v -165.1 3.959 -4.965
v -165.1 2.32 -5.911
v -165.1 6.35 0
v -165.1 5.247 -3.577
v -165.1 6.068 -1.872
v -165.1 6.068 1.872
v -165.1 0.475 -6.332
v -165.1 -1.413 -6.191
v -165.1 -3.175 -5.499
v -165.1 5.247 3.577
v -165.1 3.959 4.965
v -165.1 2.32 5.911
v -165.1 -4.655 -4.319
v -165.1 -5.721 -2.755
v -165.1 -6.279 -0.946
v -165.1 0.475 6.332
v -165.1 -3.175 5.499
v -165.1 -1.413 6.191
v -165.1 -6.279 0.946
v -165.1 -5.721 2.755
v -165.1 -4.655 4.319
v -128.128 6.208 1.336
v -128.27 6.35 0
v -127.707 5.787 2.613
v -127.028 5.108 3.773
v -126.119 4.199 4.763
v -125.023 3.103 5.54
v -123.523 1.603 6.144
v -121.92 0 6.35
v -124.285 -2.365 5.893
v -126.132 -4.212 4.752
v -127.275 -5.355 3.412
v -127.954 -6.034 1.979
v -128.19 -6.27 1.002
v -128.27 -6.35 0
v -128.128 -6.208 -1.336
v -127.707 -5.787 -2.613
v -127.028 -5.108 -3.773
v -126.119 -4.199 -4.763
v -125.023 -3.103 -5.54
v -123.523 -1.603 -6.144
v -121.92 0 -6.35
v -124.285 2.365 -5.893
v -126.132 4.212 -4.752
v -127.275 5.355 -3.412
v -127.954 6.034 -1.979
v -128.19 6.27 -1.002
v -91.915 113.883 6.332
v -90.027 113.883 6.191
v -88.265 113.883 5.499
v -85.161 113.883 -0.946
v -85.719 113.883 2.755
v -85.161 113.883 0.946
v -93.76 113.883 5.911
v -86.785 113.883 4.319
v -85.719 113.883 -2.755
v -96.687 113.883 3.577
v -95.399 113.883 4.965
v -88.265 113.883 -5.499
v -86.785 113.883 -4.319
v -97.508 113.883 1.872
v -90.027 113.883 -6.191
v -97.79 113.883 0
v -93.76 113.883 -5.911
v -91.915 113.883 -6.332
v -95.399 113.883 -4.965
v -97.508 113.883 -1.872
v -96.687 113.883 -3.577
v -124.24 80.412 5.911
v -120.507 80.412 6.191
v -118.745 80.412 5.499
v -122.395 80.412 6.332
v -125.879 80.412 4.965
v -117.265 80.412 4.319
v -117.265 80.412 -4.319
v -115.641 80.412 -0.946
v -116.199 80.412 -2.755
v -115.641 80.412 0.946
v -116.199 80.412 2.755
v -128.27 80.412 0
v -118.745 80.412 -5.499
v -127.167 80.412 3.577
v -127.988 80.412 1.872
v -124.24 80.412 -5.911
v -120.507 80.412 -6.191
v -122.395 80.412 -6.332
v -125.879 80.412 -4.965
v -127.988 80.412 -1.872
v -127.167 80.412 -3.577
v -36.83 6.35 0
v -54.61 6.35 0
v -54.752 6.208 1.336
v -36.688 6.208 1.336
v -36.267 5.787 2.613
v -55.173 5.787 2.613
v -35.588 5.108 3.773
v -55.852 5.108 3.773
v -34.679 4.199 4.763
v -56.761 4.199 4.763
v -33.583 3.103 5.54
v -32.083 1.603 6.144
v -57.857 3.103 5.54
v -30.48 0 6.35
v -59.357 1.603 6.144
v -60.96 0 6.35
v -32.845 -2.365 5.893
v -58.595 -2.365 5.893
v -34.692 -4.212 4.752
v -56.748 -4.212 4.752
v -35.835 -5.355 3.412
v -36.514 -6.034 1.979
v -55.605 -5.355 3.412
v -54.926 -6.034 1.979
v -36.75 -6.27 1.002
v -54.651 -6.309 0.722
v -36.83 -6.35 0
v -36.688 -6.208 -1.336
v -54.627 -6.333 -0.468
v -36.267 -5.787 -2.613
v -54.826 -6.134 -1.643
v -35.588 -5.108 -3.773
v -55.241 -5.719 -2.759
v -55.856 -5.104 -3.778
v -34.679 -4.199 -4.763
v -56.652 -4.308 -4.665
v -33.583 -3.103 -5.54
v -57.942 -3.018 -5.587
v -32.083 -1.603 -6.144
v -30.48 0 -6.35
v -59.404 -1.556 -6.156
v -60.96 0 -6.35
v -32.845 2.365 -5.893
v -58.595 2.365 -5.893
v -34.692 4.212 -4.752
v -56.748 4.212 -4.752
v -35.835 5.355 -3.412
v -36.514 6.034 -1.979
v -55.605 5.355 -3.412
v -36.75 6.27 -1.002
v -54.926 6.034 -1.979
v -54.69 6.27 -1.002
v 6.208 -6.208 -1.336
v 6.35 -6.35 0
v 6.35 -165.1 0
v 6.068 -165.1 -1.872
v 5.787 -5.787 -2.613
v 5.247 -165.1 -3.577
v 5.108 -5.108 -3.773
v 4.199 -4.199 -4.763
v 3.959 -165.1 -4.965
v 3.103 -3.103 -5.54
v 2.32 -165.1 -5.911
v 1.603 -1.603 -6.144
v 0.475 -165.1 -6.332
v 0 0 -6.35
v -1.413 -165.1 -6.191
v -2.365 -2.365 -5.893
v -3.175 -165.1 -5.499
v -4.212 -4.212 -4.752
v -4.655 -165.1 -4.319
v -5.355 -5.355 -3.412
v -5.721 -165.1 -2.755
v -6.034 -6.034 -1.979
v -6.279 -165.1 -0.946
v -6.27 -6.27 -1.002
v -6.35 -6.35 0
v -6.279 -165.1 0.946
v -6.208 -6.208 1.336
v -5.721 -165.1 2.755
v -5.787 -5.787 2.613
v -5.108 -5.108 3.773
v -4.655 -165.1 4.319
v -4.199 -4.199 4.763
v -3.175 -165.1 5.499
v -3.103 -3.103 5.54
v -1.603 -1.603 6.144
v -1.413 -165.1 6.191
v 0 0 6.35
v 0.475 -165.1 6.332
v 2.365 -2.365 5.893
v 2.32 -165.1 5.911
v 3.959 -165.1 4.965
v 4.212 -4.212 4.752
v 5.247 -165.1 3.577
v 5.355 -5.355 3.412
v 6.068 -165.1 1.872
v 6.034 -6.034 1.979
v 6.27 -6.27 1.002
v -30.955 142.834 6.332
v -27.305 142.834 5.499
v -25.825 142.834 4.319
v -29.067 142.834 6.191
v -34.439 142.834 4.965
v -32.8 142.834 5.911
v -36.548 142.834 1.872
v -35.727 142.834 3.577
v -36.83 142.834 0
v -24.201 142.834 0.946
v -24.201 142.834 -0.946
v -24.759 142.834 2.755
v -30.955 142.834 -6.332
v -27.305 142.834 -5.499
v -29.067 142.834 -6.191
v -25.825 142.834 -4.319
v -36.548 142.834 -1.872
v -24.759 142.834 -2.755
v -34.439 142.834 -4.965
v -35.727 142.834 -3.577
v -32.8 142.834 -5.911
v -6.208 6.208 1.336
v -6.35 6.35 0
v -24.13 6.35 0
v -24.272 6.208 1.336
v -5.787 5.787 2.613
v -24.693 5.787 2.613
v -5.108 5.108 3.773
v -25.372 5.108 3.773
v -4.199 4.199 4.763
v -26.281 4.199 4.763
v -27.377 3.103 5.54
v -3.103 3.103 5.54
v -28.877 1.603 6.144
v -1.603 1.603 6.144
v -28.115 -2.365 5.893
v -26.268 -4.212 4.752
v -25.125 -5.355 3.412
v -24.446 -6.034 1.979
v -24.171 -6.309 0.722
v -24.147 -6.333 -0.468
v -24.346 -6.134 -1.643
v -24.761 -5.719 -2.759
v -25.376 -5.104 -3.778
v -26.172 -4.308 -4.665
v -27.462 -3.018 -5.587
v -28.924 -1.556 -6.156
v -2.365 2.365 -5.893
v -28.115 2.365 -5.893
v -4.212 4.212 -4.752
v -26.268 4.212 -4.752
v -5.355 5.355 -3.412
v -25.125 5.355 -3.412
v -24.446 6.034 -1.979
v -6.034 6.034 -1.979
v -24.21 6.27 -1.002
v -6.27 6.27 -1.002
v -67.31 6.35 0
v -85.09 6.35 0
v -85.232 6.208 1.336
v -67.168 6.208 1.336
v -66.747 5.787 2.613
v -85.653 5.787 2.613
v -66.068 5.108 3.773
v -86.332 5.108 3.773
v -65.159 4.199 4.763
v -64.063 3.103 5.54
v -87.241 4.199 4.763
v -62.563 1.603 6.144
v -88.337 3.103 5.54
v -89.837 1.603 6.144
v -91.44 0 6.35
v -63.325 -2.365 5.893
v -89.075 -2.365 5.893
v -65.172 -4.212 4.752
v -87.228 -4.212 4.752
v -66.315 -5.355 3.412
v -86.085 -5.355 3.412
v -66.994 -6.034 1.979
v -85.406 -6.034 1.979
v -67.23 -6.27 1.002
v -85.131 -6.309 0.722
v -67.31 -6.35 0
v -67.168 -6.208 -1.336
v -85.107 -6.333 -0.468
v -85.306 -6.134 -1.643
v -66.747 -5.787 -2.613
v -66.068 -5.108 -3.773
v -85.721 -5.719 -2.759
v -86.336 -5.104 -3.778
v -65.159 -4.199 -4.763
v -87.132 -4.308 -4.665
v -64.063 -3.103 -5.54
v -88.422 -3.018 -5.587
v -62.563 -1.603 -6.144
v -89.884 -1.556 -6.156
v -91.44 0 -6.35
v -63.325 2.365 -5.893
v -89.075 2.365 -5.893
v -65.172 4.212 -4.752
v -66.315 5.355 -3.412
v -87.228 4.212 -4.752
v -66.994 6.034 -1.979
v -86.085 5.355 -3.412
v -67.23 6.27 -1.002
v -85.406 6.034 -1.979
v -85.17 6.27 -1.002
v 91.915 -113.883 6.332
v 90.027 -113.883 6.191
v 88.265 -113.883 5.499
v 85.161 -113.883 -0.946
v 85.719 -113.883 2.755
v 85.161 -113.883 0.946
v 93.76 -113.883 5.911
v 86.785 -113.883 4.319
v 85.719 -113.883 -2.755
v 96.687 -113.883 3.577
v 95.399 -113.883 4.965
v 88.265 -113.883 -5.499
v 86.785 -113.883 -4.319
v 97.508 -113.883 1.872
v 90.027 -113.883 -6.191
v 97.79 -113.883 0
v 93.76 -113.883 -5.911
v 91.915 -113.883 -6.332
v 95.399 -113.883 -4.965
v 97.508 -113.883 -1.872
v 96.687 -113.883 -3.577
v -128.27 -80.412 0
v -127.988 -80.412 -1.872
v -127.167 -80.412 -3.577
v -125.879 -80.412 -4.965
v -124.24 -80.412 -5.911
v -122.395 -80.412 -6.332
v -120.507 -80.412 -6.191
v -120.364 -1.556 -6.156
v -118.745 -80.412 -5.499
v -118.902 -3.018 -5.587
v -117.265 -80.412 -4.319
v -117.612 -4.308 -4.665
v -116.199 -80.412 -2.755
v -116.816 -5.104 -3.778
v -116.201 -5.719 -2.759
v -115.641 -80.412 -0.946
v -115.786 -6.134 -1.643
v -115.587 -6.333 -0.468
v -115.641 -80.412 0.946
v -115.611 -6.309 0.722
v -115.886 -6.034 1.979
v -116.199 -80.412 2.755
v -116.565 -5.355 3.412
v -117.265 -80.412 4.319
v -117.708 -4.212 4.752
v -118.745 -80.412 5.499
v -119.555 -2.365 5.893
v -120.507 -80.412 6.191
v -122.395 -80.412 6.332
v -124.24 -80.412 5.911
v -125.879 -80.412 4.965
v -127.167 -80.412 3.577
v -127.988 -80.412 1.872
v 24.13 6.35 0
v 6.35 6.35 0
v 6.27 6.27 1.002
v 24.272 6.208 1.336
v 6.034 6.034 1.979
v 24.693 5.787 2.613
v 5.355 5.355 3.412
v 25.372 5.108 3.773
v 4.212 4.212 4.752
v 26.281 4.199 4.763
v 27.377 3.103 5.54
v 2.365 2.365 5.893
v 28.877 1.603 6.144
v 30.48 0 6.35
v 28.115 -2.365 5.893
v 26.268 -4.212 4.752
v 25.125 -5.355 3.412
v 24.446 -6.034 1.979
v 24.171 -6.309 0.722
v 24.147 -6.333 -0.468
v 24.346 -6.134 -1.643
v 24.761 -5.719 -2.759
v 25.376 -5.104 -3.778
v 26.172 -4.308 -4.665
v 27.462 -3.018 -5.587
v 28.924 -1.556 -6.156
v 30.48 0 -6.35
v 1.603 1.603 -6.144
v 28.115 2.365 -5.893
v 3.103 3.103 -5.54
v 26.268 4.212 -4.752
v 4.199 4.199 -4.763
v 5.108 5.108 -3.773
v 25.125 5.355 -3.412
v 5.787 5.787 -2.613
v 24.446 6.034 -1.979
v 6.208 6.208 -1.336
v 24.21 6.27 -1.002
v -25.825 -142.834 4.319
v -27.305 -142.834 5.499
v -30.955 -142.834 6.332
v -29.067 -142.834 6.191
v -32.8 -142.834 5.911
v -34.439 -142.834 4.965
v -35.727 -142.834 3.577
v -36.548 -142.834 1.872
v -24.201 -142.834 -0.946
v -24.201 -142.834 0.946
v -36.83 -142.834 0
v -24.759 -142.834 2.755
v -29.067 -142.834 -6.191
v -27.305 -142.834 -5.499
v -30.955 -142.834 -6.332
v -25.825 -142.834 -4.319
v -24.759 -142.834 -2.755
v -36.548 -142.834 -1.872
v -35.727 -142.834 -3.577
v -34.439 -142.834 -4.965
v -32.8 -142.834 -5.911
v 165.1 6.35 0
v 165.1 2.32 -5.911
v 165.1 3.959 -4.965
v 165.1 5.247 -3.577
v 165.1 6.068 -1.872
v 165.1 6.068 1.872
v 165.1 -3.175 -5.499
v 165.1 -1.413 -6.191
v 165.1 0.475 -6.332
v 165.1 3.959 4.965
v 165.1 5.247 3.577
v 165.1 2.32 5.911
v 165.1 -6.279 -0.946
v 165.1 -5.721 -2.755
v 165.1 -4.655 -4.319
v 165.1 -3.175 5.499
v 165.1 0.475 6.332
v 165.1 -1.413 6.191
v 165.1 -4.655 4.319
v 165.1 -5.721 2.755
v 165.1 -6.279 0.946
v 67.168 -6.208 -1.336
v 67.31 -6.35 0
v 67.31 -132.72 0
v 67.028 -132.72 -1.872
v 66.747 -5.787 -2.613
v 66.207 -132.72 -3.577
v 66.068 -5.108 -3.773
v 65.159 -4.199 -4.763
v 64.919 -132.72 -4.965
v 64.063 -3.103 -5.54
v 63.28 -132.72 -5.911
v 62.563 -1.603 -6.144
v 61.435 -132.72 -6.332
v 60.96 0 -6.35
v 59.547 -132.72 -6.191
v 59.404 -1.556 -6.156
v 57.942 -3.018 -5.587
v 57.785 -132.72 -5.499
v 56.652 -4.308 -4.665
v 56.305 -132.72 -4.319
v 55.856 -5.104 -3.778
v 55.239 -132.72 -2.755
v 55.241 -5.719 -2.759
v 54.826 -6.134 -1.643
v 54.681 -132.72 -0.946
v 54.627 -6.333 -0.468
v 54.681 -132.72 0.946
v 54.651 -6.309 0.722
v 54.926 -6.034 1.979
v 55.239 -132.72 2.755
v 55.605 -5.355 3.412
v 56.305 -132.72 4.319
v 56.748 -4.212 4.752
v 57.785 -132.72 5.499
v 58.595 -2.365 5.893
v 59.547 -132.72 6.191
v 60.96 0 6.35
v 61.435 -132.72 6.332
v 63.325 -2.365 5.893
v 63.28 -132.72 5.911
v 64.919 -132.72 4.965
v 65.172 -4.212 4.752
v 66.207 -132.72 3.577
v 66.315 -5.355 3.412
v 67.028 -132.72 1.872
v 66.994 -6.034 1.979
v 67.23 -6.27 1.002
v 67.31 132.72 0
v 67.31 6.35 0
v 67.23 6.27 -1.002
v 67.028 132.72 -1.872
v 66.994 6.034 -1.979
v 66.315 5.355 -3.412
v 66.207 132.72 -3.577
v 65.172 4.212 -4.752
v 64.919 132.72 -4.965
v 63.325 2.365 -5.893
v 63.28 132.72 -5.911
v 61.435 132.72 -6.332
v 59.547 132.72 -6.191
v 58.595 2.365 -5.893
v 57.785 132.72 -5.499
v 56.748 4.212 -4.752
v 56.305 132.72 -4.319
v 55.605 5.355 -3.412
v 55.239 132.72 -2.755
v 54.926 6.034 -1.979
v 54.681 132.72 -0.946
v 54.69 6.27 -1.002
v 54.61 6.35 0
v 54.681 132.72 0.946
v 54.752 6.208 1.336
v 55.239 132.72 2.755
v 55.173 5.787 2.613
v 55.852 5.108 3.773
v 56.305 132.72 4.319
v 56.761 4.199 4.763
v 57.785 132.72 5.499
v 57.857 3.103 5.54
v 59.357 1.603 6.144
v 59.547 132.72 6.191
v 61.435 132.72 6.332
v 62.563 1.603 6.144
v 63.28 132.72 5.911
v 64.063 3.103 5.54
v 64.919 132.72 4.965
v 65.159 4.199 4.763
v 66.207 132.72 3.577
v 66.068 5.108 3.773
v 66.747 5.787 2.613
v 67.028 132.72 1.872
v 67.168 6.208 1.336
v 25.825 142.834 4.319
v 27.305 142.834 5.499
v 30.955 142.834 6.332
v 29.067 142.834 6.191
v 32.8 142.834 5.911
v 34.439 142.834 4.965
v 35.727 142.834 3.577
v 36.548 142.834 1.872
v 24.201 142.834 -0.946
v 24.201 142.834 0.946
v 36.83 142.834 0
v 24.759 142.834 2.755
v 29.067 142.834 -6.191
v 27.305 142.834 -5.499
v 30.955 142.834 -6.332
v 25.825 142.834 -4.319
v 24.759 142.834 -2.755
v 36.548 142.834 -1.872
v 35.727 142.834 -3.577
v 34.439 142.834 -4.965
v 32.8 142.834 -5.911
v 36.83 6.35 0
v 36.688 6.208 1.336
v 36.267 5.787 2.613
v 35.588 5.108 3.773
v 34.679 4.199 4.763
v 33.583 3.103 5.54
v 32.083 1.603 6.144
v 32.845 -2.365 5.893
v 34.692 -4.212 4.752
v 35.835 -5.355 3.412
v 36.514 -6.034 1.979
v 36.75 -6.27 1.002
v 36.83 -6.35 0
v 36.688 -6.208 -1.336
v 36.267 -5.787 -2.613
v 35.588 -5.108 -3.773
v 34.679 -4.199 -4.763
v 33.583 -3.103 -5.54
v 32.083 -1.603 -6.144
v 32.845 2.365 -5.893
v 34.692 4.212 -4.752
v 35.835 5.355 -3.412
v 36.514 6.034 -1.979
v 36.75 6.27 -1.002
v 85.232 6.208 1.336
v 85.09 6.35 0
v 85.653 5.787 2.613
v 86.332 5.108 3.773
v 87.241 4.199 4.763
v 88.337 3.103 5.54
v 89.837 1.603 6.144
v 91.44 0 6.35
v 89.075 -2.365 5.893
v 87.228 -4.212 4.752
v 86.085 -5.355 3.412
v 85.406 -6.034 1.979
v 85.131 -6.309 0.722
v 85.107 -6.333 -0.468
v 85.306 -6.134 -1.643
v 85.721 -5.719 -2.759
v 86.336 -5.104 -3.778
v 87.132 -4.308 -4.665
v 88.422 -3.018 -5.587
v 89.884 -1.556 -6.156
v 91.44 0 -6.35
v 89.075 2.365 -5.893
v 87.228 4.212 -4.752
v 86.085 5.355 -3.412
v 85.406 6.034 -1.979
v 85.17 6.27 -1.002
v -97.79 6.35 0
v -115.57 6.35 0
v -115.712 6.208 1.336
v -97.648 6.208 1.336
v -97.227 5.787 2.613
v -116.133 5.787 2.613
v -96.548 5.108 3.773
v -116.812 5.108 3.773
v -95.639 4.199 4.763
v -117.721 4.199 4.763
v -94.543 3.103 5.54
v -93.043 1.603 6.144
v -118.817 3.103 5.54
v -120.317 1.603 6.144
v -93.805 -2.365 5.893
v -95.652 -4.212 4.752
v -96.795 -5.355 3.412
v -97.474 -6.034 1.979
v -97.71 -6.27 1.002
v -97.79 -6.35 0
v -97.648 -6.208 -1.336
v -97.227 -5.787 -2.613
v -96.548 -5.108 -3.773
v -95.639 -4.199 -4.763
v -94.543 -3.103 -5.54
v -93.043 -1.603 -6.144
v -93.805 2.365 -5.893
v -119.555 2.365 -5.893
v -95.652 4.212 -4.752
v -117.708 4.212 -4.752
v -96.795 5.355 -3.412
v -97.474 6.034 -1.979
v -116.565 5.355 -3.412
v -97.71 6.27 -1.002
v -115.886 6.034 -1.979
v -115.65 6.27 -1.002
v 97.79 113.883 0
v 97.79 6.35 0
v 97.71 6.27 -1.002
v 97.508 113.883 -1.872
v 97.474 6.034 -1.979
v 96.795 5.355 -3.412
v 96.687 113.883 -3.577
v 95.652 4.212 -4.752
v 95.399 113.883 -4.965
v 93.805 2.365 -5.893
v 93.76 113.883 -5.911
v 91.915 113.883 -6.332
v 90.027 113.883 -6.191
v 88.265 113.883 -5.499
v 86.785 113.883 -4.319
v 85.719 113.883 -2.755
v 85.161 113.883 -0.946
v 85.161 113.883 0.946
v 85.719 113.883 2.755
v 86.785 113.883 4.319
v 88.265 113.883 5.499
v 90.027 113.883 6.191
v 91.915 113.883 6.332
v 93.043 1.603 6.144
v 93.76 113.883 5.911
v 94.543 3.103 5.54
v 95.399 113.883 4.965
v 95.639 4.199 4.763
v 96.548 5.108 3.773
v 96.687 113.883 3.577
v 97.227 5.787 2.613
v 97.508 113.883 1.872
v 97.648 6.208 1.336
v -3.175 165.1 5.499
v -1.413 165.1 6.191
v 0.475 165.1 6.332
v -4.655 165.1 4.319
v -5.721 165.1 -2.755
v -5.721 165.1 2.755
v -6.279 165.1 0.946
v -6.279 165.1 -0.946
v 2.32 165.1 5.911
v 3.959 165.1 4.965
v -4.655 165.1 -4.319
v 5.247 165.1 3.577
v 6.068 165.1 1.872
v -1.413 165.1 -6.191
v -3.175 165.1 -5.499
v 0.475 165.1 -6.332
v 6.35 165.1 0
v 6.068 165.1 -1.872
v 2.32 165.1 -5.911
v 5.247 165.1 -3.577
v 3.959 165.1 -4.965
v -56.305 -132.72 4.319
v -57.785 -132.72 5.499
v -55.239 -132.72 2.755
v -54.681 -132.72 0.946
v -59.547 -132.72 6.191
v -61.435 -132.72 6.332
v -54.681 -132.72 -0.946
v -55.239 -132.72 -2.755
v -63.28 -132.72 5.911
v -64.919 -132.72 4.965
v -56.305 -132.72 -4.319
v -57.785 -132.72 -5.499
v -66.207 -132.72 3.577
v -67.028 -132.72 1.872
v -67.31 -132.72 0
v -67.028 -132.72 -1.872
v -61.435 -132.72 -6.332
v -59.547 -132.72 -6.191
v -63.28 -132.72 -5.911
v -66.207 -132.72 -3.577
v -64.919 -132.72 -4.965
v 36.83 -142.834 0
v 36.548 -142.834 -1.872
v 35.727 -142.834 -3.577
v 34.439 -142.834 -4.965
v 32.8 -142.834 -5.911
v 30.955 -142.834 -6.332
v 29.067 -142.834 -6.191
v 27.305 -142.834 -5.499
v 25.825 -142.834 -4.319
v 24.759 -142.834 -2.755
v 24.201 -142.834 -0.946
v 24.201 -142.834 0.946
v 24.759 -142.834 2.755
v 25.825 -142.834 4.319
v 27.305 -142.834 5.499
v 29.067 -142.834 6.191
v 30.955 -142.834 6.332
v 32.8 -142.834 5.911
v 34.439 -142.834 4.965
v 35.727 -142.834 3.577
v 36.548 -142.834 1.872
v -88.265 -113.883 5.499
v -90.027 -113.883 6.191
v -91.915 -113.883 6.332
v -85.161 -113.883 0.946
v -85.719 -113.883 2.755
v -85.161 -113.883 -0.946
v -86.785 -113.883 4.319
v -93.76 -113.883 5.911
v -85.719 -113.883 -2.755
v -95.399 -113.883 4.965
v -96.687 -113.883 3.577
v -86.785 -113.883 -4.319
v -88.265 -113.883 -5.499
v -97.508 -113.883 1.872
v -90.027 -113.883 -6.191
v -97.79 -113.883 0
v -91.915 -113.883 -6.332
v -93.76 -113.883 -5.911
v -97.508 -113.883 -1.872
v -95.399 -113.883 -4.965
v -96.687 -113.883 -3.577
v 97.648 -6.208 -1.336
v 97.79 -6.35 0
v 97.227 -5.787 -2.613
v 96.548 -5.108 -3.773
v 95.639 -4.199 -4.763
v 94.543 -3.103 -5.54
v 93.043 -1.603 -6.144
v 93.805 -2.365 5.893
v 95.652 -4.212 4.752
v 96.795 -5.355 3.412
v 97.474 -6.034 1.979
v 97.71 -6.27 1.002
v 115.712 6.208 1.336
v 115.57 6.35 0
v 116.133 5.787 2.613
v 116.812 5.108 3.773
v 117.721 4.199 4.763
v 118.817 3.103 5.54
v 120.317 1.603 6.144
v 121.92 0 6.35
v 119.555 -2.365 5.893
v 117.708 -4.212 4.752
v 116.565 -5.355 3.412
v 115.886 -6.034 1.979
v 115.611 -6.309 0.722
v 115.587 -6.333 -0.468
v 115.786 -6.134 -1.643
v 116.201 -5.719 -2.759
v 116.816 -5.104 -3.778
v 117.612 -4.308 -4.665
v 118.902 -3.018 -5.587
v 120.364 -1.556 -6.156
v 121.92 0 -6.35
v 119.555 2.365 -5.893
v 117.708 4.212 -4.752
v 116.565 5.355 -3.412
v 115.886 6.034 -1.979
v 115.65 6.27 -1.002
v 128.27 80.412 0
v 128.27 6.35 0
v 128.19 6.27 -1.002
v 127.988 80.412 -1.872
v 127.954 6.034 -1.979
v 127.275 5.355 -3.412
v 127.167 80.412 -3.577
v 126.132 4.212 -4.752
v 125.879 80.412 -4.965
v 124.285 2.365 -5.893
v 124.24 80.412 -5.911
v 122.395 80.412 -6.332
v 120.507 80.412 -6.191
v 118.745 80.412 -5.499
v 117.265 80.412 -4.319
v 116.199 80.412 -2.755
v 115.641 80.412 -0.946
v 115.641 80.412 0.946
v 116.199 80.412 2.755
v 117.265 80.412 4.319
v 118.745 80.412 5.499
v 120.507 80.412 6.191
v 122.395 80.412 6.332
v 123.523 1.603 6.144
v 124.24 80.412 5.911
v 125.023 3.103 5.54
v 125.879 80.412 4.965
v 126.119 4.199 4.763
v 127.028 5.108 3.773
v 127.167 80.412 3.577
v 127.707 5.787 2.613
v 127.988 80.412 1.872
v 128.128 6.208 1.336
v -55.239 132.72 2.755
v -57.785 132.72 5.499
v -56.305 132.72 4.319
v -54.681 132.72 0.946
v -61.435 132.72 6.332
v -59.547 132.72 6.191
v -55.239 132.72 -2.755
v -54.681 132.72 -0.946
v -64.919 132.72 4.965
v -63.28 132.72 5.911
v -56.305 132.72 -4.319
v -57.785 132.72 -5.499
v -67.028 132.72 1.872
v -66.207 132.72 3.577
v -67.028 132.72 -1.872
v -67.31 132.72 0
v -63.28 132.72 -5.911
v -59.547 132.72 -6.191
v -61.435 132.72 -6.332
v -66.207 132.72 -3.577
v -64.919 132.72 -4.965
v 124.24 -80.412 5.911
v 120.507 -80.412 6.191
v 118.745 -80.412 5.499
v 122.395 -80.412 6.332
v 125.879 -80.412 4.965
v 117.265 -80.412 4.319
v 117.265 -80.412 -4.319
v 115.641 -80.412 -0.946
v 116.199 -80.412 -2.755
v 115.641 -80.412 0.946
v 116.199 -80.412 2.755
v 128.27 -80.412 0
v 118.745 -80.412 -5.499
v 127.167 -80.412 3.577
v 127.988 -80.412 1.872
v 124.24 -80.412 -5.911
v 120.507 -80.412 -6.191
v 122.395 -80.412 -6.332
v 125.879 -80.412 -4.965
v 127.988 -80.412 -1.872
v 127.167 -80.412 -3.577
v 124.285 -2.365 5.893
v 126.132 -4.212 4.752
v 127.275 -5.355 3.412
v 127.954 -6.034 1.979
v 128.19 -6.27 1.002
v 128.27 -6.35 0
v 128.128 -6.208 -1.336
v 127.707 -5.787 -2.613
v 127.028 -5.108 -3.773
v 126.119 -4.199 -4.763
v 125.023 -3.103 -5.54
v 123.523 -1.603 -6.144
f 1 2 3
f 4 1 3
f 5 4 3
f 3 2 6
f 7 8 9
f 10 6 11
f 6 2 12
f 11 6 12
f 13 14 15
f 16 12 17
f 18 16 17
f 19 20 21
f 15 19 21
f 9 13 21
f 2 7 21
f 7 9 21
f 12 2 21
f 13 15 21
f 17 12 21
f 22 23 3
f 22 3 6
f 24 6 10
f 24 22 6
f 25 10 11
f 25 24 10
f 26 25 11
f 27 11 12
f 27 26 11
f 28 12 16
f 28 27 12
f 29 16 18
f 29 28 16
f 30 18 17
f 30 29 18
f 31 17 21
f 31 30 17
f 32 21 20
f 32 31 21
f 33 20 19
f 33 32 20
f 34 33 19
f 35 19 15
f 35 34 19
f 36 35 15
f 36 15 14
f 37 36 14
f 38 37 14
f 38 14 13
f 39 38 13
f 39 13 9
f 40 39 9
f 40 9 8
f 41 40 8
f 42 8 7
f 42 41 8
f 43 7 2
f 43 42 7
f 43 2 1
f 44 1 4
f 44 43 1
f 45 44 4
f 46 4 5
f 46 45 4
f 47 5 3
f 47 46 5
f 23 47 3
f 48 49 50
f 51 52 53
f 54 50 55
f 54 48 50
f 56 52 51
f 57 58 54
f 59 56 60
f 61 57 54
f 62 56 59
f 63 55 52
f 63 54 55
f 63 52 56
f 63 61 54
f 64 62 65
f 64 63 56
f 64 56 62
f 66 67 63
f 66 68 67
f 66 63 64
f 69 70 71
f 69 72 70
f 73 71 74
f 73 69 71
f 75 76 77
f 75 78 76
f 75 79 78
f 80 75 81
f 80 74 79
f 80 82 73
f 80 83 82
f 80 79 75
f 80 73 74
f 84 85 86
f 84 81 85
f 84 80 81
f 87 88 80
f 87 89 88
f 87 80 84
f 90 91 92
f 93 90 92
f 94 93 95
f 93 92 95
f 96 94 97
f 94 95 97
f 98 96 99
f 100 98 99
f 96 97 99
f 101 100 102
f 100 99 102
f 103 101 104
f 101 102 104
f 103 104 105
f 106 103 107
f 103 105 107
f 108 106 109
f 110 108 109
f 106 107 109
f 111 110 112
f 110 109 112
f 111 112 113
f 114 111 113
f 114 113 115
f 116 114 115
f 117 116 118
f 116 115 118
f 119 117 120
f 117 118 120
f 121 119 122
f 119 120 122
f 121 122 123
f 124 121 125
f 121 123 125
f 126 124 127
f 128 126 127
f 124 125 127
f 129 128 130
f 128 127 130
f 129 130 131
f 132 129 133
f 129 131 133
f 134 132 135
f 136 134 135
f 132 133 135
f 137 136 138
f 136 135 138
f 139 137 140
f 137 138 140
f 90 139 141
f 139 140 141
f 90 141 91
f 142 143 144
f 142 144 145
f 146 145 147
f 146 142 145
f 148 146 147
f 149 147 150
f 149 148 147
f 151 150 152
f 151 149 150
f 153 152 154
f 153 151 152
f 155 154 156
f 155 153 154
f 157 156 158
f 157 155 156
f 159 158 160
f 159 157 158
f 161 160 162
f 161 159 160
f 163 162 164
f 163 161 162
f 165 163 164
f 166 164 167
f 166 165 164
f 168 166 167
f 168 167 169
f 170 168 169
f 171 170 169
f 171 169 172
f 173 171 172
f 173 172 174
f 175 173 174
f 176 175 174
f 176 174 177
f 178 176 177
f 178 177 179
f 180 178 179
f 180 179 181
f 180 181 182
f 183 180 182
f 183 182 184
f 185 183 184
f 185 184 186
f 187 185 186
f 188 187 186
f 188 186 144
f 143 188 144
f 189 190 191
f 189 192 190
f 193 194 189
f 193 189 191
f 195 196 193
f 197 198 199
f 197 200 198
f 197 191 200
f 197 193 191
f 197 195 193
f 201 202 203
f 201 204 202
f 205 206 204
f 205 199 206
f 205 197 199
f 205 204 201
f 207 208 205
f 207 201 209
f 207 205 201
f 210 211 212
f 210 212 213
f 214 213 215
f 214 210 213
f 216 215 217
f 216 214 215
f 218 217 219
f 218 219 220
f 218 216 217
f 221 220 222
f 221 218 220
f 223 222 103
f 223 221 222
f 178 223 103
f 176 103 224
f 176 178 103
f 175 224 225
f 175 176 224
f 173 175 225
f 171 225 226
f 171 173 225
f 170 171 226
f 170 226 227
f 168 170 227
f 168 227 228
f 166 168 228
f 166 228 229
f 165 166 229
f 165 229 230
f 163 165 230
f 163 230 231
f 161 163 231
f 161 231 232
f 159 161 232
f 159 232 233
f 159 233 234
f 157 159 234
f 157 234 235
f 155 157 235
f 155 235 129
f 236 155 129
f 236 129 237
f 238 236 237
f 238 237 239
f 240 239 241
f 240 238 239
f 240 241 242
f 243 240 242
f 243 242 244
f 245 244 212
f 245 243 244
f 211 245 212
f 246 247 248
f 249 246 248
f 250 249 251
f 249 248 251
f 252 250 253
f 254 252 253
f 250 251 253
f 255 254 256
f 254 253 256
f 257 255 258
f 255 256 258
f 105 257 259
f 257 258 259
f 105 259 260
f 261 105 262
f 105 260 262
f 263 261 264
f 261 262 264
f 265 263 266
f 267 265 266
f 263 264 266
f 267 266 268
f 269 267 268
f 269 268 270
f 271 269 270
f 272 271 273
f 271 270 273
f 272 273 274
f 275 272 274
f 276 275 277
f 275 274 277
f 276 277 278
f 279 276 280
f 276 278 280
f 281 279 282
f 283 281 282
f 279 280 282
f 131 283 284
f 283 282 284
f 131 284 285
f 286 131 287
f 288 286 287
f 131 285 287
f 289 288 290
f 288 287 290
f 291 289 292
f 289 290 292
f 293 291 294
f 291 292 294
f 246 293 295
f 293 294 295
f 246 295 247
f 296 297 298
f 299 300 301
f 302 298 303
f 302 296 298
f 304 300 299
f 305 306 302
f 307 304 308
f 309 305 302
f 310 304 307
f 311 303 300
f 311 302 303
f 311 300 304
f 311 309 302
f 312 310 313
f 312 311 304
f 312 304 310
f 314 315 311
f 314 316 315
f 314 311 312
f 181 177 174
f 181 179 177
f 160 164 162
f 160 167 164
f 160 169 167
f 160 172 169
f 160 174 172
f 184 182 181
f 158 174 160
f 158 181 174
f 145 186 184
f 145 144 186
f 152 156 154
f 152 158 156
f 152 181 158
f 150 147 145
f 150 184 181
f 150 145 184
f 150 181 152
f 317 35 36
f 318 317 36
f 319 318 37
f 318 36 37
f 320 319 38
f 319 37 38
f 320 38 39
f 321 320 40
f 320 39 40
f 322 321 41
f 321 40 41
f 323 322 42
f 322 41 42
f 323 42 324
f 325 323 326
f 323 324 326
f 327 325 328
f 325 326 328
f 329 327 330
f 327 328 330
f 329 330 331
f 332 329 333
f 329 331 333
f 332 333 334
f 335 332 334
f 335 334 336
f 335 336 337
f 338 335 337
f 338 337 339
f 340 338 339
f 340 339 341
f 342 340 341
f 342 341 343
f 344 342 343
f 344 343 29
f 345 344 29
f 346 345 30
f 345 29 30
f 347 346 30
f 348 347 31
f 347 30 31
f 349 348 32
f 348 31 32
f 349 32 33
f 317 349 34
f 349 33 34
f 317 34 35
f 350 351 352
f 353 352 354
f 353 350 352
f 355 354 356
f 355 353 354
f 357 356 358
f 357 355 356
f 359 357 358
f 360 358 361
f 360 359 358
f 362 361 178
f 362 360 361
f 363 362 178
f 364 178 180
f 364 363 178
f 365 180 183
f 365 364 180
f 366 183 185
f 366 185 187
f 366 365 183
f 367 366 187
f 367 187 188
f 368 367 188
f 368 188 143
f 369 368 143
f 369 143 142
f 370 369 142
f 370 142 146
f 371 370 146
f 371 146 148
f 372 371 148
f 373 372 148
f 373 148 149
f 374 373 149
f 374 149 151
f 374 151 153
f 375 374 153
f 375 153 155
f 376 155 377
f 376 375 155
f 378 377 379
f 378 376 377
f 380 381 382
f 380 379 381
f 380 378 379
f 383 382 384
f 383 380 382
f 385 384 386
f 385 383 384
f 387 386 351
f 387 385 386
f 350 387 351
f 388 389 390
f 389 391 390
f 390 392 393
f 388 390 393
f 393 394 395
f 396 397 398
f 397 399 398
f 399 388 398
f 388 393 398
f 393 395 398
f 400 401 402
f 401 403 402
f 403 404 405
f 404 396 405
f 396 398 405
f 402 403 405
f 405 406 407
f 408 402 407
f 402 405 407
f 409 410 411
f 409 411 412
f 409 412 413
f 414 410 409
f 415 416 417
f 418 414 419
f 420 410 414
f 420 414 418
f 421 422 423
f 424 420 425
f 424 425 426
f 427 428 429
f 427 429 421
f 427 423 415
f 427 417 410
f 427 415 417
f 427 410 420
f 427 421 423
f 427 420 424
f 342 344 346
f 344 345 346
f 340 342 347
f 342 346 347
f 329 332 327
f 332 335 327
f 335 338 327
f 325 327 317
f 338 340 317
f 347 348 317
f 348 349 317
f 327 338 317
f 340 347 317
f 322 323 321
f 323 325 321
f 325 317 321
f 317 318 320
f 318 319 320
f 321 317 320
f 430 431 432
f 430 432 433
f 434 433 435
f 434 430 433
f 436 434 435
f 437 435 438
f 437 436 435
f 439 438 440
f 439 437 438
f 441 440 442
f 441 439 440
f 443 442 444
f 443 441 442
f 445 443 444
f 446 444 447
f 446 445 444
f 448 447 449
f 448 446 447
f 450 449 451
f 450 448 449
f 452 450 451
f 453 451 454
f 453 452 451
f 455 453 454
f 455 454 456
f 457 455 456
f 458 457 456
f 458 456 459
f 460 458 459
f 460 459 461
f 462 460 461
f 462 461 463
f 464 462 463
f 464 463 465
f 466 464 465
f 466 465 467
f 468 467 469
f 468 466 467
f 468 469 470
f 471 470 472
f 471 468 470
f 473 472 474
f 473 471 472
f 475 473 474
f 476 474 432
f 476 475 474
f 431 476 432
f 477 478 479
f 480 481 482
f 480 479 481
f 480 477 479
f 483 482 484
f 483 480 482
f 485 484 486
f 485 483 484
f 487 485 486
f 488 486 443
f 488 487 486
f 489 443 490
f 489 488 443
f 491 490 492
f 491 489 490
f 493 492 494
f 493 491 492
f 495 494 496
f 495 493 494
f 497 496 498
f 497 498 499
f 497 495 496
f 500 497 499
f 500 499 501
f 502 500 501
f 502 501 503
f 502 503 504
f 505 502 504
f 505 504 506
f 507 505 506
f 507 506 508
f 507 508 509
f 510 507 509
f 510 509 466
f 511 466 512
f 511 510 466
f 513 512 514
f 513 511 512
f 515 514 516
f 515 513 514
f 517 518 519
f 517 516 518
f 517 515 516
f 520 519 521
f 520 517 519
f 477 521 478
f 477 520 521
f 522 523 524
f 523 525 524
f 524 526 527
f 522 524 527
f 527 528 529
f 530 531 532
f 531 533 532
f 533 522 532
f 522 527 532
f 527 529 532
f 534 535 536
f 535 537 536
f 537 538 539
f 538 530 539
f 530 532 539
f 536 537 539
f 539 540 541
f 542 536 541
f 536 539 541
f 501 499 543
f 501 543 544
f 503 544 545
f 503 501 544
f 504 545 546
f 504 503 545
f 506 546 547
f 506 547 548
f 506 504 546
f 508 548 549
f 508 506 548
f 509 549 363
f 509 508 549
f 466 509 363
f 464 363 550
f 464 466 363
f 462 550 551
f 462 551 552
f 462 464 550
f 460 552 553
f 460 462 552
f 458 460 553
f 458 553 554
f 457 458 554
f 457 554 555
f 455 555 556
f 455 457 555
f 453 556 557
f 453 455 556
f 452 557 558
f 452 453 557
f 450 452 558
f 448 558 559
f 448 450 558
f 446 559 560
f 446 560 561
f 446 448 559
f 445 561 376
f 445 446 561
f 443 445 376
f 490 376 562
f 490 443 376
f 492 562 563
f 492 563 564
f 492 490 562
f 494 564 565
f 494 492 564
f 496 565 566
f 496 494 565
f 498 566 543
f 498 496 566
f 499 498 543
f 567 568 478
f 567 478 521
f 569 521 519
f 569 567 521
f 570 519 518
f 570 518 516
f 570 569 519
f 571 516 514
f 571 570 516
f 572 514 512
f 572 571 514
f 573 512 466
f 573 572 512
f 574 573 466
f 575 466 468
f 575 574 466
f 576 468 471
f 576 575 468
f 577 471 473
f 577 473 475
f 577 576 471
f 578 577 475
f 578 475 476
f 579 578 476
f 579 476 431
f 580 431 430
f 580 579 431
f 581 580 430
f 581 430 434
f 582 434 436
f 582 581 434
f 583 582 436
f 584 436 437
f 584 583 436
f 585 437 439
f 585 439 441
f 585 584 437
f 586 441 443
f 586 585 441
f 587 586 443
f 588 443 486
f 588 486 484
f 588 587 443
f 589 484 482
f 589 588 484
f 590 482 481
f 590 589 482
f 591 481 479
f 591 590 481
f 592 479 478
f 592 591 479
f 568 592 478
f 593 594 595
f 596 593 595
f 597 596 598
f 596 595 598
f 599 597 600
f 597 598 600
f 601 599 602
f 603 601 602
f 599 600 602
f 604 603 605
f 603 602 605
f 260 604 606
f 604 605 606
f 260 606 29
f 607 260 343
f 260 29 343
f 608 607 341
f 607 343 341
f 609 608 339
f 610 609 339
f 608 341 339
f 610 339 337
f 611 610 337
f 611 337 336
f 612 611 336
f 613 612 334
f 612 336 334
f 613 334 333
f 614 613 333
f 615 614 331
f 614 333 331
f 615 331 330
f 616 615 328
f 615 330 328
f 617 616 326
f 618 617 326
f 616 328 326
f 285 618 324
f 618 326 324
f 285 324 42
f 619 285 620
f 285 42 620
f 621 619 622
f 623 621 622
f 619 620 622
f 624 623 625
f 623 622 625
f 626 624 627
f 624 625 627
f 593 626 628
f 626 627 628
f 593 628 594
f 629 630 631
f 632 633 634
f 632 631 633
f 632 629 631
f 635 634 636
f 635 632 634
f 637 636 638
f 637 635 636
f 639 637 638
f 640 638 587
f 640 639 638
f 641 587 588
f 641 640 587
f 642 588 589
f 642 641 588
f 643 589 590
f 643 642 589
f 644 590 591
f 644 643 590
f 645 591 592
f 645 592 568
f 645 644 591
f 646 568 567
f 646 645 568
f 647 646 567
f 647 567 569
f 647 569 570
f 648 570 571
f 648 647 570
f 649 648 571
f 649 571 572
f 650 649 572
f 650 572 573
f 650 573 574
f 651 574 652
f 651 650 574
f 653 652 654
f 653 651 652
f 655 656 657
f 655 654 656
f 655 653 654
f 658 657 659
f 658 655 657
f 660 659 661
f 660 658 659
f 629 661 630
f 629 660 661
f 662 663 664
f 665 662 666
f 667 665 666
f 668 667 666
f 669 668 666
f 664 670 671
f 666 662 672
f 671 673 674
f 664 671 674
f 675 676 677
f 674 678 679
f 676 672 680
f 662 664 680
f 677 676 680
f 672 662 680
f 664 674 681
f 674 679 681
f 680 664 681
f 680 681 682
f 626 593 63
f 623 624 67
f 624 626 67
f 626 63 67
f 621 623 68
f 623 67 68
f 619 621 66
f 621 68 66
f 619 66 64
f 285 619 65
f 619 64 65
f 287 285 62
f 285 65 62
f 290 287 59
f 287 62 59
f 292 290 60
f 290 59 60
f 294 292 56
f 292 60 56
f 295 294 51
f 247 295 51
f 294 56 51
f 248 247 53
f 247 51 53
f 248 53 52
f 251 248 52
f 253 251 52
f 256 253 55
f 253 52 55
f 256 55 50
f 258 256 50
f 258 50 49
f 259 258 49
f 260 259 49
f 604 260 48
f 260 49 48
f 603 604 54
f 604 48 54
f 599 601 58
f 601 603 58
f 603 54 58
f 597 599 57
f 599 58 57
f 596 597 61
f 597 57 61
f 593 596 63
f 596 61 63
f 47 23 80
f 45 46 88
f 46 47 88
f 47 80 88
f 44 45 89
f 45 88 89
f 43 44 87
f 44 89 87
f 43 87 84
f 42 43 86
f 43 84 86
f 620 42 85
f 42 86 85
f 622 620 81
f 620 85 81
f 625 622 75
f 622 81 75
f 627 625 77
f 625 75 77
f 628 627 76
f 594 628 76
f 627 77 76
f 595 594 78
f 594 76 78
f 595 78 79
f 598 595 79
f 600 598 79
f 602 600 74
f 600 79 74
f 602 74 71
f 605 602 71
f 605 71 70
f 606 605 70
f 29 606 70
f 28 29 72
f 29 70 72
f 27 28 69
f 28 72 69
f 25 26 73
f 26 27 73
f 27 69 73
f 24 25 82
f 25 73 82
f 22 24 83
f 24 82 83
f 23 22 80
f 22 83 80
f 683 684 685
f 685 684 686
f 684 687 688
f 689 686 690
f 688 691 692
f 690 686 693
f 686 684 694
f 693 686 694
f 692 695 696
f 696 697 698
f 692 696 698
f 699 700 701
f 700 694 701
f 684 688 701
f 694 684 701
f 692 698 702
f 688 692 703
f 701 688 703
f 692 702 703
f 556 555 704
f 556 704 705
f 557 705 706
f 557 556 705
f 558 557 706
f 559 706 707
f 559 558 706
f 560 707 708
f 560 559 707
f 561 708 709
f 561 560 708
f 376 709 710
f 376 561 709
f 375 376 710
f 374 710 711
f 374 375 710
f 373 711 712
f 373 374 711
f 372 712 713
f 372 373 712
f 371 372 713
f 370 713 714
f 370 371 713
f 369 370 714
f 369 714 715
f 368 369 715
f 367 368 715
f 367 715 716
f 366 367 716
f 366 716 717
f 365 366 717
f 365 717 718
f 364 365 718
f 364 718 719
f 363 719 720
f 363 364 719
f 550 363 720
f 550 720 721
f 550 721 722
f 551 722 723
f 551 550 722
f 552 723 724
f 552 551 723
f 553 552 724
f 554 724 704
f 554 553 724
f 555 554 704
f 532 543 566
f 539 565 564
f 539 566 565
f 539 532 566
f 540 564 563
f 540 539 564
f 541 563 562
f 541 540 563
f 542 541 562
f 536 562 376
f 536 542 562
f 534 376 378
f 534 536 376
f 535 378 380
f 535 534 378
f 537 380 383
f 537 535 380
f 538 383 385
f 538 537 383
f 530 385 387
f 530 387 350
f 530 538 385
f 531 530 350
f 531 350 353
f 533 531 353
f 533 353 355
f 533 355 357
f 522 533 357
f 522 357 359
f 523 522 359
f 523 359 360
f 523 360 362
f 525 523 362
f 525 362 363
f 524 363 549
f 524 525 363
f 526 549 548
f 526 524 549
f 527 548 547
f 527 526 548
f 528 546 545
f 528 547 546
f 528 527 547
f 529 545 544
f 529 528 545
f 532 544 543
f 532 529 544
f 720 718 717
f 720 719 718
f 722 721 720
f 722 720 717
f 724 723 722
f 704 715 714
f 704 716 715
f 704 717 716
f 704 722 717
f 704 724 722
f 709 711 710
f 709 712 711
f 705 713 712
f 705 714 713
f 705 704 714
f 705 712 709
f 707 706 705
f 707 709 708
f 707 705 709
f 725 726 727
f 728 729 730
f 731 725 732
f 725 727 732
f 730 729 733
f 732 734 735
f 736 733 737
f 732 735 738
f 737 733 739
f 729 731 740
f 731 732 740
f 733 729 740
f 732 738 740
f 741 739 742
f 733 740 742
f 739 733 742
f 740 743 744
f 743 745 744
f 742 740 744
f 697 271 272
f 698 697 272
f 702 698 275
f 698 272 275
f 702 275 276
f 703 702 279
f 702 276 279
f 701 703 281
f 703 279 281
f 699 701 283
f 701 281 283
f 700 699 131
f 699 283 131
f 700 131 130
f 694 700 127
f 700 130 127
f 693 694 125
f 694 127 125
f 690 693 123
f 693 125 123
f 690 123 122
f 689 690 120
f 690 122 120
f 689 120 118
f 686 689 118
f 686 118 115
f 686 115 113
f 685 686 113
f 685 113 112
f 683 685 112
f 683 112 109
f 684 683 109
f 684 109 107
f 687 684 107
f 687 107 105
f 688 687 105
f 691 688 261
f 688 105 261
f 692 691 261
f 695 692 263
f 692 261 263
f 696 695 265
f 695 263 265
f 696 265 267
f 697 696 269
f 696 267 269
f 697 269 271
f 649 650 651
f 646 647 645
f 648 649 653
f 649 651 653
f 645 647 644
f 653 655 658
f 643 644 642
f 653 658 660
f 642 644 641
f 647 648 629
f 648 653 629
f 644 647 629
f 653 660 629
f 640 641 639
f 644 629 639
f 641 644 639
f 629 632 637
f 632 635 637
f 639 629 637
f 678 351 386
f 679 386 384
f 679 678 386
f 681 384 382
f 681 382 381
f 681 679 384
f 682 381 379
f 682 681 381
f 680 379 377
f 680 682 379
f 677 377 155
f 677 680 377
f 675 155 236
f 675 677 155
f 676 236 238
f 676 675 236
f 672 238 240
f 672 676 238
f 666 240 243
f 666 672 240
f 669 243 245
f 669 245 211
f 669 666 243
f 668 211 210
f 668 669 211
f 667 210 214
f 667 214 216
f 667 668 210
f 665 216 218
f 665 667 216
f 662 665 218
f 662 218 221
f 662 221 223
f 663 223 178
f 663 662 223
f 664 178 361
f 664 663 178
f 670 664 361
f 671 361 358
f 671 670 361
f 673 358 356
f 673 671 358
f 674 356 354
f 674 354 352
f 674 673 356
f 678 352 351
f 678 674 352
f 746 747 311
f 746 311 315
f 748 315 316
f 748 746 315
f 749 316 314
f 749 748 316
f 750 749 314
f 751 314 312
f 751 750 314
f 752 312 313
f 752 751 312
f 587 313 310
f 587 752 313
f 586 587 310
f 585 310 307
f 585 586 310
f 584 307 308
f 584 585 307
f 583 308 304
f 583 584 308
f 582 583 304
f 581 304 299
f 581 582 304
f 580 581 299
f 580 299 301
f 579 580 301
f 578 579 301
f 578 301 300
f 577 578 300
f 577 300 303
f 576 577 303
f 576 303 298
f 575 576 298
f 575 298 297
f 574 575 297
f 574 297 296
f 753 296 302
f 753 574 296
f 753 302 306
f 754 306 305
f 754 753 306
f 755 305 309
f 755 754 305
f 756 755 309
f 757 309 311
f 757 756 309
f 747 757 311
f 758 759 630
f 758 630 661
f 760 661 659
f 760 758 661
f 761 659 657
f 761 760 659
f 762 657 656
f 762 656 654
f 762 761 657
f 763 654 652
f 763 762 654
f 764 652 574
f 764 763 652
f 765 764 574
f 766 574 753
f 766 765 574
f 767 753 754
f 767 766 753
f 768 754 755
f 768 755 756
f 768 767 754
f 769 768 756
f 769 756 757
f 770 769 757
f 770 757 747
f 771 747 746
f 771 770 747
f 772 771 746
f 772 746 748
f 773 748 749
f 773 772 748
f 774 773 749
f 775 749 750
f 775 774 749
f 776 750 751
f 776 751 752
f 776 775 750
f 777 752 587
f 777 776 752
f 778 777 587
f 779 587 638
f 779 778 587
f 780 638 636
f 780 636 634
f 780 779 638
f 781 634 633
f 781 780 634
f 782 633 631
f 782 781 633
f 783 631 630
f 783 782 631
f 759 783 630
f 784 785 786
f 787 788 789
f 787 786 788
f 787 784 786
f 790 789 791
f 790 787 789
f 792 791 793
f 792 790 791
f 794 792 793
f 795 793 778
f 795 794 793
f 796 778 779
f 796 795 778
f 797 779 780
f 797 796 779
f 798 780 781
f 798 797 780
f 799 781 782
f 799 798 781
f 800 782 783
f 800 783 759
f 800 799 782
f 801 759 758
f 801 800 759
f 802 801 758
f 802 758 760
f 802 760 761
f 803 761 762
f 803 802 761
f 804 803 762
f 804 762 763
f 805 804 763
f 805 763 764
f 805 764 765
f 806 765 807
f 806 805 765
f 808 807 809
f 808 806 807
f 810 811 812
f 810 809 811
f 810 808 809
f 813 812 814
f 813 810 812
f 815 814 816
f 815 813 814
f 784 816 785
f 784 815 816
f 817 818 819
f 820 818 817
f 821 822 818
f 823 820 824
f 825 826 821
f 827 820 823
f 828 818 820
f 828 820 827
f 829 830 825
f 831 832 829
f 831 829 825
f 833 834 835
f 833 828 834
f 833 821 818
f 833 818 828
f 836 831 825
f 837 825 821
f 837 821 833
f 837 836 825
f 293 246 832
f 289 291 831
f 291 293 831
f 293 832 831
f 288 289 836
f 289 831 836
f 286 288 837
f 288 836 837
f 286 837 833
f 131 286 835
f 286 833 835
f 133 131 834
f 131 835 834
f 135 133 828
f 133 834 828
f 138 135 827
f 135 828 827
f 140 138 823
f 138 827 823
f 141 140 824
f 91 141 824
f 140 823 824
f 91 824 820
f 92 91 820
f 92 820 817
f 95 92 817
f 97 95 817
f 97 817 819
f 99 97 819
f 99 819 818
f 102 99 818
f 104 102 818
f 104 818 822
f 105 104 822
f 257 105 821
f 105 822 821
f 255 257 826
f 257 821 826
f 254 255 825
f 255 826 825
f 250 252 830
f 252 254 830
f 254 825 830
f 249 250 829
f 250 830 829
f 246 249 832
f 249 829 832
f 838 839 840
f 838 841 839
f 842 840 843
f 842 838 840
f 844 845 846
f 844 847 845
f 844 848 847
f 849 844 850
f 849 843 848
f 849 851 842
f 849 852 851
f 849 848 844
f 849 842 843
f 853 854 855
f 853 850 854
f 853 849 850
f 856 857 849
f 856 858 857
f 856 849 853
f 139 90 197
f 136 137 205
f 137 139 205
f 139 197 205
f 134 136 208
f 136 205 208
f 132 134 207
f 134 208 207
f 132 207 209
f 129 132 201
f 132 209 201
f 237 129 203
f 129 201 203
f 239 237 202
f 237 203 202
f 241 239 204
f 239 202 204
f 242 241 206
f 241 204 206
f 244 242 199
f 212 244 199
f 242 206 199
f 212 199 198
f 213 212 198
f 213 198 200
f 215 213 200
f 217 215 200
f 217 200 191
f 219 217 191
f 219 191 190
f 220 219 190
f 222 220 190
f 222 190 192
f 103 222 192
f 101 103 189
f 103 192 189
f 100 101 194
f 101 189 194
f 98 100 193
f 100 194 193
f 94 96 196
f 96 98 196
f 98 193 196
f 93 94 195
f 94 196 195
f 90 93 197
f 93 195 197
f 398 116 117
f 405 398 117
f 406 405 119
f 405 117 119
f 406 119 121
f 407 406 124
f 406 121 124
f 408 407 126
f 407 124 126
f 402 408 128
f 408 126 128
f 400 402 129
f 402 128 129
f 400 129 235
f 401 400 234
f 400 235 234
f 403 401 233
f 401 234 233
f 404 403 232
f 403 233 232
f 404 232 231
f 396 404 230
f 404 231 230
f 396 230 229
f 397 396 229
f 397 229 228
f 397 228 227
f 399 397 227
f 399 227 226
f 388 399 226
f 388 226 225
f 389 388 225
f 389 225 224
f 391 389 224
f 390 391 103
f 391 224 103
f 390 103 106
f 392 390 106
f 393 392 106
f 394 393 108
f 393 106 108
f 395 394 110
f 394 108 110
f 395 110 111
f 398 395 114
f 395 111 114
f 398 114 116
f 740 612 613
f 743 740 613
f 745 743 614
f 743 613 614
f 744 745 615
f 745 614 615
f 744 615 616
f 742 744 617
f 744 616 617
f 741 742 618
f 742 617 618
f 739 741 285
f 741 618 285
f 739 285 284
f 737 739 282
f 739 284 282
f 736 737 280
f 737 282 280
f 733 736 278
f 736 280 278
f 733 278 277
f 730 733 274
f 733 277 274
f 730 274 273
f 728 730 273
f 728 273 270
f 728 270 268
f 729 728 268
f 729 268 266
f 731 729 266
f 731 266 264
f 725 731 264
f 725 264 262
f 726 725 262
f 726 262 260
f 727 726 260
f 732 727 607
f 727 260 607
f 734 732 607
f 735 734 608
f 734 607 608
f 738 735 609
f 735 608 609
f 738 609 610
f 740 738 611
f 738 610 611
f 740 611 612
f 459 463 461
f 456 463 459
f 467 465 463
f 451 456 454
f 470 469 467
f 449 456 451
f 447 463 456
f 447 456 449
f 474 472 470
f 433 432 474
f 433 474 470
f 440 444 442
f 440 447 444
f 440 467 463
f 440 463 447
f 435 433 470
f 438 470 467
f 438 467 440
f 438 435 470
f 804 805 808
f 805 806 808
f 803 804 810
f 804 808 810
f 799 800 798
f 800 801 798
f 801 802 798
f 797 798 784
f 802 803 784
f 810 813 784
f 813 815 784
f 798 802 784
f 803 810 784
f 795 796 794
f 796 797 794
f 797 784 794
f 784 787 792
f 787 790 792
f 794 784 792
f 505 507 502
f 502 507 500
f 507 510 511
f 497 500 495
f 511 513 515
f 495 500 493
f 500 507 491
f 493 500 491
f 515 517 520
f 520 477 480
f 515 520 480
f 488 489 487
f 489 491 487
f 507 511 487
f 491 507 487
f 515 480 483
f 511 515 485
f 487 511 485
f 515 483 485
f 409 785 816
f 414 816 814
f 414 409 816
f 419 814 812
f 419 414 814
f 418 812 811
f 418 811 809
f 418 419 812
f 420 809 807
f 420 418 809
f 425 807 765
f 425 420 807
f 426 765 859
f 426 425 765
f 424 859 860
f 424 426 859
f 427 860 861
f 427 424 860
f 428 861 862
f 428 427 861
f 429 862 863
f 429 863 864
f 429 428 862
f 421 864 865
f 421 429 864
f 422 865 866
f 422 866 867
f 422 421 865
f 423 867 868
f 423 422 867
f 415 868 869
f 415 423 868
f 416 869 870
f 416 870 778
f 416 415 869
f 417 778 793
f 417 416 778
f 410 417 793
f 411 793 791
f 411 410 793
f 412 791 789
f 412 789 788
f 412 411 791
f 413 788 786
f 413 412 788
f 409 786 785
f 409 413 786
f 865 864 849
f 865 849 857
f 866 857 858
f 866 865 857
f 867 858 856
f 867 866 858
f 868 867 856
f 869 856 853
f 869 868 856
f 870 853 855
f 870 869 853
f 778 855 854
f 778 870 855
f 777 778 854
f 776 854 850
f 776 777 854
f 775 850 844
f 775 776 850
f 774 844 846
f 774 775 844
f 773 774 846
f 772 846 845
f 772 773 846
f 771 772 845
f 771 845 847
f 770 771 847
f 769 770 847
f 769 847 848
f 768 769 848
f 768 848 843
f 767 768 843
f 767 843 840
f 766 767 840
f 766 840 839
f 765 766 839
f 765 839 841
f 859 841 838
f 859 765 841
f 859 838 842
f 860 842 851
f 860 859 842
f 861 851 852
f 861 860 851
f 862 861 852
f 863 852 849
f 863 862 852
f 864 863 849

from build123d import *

# Parameters (mm, degrees)
F3_R  = 6.35
F6_R  = 6.35
F9_R  = 6.35
F12_R = 6.35
F15_R = 6.35
F18_R = 6.35


with BuildPart() as f4:
    # F4: sweep along a path in F0
    with BuildLine(Plane.XY) as f4_path:
        Line((0, -165.1), (0, 165.1))
    # F3 (on plane+point) → F4 (sweep)
    with BuildSketch(Plane.XZ.offset(-165.1)):
        Circle(F3_R)
    sweep(path=f4_path.line)

    # F7: sweep along a path in F0
    with BuildLine(Plane.XY) as f7_path:
        Line((-165.1, 0), (165.1, 0))
    # F6 (on plane+point) → F7 (sweep)
    with BuildSketch(Plane.YZ.offset(165.1)):
        Circle(F6_R)
    sweep(path=f7_path.line)

    # F10: sweep along a path in F0
    with BuildLine(Plane.XY) as f10_path:
        Line((30.48, -142.8340719156), (30.48, 142.8340719156))
    # F9 (on plane+point) → F10 (sweep)
    with BuildSketch(Plane.XZ.offset(142.8340719156)):
        with Locations((30.48, 0)):
            Circle(F9_R)
    sweep(path=f10_path.line)

    # F13: sweep along a path in F0
    with BuildLine(Plane.XY) as f13_path:
        Line((60.96, -132.719557338), (60.96, 132.719557338))
    # F12 (on plane+point) → F13 (sweep)
    with BuildSketch(Plane.XZ.offset(132.719557338)):
        with Locations((60.96, 0)):
            Circle(F12_R)
    sweep(path=f13_path.line)

    # F16: sweep along a path in F0
    with BuildLine(Plane.XY) as f16_path:
        Line((91.44, -113.8829614121), (91.44, 113.8829614121))
    # F15 (on plane+point) → F16 (sweep)
    with BuildSketch(Plane.XZ.offset(113.8829614121)):
        with Locations((91.44, 0)):
            Circle(F15_R)
    sweep(path=f16_path.line)

    # F19: sweep along a path in F0
    with BuildLine(Plane.XY) as f19_path:
        Line((121.92, -80.4121638808), (121.92, 80.4121638808))
    # F18 (on plane+point) → F19 (sweep)
    with BuildSketch(Plane.XZ.offset(80.4121638808)):
        with Locations((121.92, 0)):
            Circle(F18_R)
    sweep(path=f19_path.line)

    # F20: F4 across plane


with BuildPart() as f4_1:
    add(f4.part)
    add(f4.part.mirror(Plane.YZ))


solid = f4_1.part
